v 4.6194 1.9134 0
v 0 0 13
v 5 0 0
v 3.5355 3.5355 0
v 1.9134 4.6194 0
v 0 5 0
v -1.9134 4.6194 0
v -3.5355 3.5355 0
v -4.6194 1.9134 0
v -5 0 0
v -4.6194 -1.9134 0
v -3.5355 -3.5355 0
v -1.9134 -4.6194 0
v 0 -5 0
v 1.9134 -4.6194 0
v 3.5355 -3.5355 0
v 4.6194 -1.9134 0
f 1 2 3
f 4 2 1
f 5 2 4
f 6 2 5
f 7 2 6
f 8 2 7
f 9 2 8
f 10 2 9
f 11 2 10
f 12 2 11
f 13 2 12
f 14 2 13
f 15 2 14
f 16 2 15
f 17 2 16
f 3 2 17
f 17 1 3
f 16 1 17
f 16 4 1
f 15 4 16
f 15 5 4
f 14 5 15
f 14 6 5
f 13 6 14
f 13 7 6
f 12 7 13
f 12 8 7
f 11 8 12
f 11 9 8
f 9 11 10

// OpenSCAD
// Generated by SolidPython 1.0.1 on 2020-07-29 00:46:43


cylinder(h = 13, r1 = 5, r2 = 0);
/***********************************************
*********      SolidPython code:      **********
************************************************
 
# import packages: SolidPython
from solid import *
from solid.utils import *
from itertools import chain, combinations, permutations


class Resize:

    def __init__(self, scad_file):
        self.scad_file = scad_file
        #self.scad_file = import_scad(scad_file)
        # cone/cylinder param:
        self.r1 = 0
        self.r2 = 0
        self.h = 0
        # rectangular prism param:
        self.w = 0
        self.l = 0
        # ellipse param:
        self.r = 0

    # import OpenScad code (file name corresponds to shape)


    # classify shape + parameters
    def assign(self, param1, param2, param3):
        if self.scad_file == 'cone.scad':
            self.r1 = param1
            self.r2 = param2
            self.h = param3
        elif self.scad_file == 'cylinder.scad':
            self.r1 = param1
            self.r2 = param2
            self.h = param3
        elif self.scad_file == 'rectangularPrism.scad':
            self.h = param1
            self.l = param2
            self.w = param3
        else:
            self.r = param1
            self.h = param2

    # resize parameters
    def iterate(self):
        x = range(3, 20, 2)
        i = 1
        if self.scad_file == 'cone.scad':
            tempList = list(permutations(x, 2))
            for temp in tempList:
                param1 = temp[0]
                param2 = temp[1]
                filepath = 'produced_scad_files/' + 'cone' + str(param1) + '_' + str(param2) + '_' + '.scad'
                scad_render_to_file(cylinder(h=param1, r1=param2, r2=0), filepath)

        elif self.scad_file == 'cylinder.scad':
            tempList = list(permutations(x, 3))
            for temp in tempList:
                param1 = temp[0]
                param2 = temp[1]
                filepath = 'produced_scad_files/' + 'cylinder' + str(param1) + '_' + str(param2) + '_' + '.scad'
                scad_render_to_file(cylinder(h=param1, r1=param2, r2=param2), filepath)

        elif self.scad_file == 'rectangularPrism.scad':
            tempList = list(permutations(x, 3))
            for temp in tempList:
                param1 = temp[0]
                param2 = temp[1]
                param3 = temp[2]
                filepath = 'produced_scad_files/' + 'rectangularPrism' + str(param1) + '_' + str(param2) + '_' + str(
                    param3) + '.scad'
                scad_render_to_file(cube(size=(param1, param2, param3)), filepath)

        elif self.scad_file == 'ellipse.scad':
            tempList = list(permutations(x, 4))
            for temp in tempList:
                param1 = temp[0]
                param2 = temp[1]
                param3 = temp[2]
                param4 = temp[3]
                filepath = 'produced_scad_files/' + 'ellipse' + str(param1) + '_' + str(param2) + '_' + str(param3) + '_' + str(param4) + '.scad'
                scad_render_to_file(scale([param1, param2, param3])(sphere(r=param4)), filepath)

    def render_to_scadfile(self):
        scad_render_to_file(scad, 'example.scad') 
 
************************************************/
